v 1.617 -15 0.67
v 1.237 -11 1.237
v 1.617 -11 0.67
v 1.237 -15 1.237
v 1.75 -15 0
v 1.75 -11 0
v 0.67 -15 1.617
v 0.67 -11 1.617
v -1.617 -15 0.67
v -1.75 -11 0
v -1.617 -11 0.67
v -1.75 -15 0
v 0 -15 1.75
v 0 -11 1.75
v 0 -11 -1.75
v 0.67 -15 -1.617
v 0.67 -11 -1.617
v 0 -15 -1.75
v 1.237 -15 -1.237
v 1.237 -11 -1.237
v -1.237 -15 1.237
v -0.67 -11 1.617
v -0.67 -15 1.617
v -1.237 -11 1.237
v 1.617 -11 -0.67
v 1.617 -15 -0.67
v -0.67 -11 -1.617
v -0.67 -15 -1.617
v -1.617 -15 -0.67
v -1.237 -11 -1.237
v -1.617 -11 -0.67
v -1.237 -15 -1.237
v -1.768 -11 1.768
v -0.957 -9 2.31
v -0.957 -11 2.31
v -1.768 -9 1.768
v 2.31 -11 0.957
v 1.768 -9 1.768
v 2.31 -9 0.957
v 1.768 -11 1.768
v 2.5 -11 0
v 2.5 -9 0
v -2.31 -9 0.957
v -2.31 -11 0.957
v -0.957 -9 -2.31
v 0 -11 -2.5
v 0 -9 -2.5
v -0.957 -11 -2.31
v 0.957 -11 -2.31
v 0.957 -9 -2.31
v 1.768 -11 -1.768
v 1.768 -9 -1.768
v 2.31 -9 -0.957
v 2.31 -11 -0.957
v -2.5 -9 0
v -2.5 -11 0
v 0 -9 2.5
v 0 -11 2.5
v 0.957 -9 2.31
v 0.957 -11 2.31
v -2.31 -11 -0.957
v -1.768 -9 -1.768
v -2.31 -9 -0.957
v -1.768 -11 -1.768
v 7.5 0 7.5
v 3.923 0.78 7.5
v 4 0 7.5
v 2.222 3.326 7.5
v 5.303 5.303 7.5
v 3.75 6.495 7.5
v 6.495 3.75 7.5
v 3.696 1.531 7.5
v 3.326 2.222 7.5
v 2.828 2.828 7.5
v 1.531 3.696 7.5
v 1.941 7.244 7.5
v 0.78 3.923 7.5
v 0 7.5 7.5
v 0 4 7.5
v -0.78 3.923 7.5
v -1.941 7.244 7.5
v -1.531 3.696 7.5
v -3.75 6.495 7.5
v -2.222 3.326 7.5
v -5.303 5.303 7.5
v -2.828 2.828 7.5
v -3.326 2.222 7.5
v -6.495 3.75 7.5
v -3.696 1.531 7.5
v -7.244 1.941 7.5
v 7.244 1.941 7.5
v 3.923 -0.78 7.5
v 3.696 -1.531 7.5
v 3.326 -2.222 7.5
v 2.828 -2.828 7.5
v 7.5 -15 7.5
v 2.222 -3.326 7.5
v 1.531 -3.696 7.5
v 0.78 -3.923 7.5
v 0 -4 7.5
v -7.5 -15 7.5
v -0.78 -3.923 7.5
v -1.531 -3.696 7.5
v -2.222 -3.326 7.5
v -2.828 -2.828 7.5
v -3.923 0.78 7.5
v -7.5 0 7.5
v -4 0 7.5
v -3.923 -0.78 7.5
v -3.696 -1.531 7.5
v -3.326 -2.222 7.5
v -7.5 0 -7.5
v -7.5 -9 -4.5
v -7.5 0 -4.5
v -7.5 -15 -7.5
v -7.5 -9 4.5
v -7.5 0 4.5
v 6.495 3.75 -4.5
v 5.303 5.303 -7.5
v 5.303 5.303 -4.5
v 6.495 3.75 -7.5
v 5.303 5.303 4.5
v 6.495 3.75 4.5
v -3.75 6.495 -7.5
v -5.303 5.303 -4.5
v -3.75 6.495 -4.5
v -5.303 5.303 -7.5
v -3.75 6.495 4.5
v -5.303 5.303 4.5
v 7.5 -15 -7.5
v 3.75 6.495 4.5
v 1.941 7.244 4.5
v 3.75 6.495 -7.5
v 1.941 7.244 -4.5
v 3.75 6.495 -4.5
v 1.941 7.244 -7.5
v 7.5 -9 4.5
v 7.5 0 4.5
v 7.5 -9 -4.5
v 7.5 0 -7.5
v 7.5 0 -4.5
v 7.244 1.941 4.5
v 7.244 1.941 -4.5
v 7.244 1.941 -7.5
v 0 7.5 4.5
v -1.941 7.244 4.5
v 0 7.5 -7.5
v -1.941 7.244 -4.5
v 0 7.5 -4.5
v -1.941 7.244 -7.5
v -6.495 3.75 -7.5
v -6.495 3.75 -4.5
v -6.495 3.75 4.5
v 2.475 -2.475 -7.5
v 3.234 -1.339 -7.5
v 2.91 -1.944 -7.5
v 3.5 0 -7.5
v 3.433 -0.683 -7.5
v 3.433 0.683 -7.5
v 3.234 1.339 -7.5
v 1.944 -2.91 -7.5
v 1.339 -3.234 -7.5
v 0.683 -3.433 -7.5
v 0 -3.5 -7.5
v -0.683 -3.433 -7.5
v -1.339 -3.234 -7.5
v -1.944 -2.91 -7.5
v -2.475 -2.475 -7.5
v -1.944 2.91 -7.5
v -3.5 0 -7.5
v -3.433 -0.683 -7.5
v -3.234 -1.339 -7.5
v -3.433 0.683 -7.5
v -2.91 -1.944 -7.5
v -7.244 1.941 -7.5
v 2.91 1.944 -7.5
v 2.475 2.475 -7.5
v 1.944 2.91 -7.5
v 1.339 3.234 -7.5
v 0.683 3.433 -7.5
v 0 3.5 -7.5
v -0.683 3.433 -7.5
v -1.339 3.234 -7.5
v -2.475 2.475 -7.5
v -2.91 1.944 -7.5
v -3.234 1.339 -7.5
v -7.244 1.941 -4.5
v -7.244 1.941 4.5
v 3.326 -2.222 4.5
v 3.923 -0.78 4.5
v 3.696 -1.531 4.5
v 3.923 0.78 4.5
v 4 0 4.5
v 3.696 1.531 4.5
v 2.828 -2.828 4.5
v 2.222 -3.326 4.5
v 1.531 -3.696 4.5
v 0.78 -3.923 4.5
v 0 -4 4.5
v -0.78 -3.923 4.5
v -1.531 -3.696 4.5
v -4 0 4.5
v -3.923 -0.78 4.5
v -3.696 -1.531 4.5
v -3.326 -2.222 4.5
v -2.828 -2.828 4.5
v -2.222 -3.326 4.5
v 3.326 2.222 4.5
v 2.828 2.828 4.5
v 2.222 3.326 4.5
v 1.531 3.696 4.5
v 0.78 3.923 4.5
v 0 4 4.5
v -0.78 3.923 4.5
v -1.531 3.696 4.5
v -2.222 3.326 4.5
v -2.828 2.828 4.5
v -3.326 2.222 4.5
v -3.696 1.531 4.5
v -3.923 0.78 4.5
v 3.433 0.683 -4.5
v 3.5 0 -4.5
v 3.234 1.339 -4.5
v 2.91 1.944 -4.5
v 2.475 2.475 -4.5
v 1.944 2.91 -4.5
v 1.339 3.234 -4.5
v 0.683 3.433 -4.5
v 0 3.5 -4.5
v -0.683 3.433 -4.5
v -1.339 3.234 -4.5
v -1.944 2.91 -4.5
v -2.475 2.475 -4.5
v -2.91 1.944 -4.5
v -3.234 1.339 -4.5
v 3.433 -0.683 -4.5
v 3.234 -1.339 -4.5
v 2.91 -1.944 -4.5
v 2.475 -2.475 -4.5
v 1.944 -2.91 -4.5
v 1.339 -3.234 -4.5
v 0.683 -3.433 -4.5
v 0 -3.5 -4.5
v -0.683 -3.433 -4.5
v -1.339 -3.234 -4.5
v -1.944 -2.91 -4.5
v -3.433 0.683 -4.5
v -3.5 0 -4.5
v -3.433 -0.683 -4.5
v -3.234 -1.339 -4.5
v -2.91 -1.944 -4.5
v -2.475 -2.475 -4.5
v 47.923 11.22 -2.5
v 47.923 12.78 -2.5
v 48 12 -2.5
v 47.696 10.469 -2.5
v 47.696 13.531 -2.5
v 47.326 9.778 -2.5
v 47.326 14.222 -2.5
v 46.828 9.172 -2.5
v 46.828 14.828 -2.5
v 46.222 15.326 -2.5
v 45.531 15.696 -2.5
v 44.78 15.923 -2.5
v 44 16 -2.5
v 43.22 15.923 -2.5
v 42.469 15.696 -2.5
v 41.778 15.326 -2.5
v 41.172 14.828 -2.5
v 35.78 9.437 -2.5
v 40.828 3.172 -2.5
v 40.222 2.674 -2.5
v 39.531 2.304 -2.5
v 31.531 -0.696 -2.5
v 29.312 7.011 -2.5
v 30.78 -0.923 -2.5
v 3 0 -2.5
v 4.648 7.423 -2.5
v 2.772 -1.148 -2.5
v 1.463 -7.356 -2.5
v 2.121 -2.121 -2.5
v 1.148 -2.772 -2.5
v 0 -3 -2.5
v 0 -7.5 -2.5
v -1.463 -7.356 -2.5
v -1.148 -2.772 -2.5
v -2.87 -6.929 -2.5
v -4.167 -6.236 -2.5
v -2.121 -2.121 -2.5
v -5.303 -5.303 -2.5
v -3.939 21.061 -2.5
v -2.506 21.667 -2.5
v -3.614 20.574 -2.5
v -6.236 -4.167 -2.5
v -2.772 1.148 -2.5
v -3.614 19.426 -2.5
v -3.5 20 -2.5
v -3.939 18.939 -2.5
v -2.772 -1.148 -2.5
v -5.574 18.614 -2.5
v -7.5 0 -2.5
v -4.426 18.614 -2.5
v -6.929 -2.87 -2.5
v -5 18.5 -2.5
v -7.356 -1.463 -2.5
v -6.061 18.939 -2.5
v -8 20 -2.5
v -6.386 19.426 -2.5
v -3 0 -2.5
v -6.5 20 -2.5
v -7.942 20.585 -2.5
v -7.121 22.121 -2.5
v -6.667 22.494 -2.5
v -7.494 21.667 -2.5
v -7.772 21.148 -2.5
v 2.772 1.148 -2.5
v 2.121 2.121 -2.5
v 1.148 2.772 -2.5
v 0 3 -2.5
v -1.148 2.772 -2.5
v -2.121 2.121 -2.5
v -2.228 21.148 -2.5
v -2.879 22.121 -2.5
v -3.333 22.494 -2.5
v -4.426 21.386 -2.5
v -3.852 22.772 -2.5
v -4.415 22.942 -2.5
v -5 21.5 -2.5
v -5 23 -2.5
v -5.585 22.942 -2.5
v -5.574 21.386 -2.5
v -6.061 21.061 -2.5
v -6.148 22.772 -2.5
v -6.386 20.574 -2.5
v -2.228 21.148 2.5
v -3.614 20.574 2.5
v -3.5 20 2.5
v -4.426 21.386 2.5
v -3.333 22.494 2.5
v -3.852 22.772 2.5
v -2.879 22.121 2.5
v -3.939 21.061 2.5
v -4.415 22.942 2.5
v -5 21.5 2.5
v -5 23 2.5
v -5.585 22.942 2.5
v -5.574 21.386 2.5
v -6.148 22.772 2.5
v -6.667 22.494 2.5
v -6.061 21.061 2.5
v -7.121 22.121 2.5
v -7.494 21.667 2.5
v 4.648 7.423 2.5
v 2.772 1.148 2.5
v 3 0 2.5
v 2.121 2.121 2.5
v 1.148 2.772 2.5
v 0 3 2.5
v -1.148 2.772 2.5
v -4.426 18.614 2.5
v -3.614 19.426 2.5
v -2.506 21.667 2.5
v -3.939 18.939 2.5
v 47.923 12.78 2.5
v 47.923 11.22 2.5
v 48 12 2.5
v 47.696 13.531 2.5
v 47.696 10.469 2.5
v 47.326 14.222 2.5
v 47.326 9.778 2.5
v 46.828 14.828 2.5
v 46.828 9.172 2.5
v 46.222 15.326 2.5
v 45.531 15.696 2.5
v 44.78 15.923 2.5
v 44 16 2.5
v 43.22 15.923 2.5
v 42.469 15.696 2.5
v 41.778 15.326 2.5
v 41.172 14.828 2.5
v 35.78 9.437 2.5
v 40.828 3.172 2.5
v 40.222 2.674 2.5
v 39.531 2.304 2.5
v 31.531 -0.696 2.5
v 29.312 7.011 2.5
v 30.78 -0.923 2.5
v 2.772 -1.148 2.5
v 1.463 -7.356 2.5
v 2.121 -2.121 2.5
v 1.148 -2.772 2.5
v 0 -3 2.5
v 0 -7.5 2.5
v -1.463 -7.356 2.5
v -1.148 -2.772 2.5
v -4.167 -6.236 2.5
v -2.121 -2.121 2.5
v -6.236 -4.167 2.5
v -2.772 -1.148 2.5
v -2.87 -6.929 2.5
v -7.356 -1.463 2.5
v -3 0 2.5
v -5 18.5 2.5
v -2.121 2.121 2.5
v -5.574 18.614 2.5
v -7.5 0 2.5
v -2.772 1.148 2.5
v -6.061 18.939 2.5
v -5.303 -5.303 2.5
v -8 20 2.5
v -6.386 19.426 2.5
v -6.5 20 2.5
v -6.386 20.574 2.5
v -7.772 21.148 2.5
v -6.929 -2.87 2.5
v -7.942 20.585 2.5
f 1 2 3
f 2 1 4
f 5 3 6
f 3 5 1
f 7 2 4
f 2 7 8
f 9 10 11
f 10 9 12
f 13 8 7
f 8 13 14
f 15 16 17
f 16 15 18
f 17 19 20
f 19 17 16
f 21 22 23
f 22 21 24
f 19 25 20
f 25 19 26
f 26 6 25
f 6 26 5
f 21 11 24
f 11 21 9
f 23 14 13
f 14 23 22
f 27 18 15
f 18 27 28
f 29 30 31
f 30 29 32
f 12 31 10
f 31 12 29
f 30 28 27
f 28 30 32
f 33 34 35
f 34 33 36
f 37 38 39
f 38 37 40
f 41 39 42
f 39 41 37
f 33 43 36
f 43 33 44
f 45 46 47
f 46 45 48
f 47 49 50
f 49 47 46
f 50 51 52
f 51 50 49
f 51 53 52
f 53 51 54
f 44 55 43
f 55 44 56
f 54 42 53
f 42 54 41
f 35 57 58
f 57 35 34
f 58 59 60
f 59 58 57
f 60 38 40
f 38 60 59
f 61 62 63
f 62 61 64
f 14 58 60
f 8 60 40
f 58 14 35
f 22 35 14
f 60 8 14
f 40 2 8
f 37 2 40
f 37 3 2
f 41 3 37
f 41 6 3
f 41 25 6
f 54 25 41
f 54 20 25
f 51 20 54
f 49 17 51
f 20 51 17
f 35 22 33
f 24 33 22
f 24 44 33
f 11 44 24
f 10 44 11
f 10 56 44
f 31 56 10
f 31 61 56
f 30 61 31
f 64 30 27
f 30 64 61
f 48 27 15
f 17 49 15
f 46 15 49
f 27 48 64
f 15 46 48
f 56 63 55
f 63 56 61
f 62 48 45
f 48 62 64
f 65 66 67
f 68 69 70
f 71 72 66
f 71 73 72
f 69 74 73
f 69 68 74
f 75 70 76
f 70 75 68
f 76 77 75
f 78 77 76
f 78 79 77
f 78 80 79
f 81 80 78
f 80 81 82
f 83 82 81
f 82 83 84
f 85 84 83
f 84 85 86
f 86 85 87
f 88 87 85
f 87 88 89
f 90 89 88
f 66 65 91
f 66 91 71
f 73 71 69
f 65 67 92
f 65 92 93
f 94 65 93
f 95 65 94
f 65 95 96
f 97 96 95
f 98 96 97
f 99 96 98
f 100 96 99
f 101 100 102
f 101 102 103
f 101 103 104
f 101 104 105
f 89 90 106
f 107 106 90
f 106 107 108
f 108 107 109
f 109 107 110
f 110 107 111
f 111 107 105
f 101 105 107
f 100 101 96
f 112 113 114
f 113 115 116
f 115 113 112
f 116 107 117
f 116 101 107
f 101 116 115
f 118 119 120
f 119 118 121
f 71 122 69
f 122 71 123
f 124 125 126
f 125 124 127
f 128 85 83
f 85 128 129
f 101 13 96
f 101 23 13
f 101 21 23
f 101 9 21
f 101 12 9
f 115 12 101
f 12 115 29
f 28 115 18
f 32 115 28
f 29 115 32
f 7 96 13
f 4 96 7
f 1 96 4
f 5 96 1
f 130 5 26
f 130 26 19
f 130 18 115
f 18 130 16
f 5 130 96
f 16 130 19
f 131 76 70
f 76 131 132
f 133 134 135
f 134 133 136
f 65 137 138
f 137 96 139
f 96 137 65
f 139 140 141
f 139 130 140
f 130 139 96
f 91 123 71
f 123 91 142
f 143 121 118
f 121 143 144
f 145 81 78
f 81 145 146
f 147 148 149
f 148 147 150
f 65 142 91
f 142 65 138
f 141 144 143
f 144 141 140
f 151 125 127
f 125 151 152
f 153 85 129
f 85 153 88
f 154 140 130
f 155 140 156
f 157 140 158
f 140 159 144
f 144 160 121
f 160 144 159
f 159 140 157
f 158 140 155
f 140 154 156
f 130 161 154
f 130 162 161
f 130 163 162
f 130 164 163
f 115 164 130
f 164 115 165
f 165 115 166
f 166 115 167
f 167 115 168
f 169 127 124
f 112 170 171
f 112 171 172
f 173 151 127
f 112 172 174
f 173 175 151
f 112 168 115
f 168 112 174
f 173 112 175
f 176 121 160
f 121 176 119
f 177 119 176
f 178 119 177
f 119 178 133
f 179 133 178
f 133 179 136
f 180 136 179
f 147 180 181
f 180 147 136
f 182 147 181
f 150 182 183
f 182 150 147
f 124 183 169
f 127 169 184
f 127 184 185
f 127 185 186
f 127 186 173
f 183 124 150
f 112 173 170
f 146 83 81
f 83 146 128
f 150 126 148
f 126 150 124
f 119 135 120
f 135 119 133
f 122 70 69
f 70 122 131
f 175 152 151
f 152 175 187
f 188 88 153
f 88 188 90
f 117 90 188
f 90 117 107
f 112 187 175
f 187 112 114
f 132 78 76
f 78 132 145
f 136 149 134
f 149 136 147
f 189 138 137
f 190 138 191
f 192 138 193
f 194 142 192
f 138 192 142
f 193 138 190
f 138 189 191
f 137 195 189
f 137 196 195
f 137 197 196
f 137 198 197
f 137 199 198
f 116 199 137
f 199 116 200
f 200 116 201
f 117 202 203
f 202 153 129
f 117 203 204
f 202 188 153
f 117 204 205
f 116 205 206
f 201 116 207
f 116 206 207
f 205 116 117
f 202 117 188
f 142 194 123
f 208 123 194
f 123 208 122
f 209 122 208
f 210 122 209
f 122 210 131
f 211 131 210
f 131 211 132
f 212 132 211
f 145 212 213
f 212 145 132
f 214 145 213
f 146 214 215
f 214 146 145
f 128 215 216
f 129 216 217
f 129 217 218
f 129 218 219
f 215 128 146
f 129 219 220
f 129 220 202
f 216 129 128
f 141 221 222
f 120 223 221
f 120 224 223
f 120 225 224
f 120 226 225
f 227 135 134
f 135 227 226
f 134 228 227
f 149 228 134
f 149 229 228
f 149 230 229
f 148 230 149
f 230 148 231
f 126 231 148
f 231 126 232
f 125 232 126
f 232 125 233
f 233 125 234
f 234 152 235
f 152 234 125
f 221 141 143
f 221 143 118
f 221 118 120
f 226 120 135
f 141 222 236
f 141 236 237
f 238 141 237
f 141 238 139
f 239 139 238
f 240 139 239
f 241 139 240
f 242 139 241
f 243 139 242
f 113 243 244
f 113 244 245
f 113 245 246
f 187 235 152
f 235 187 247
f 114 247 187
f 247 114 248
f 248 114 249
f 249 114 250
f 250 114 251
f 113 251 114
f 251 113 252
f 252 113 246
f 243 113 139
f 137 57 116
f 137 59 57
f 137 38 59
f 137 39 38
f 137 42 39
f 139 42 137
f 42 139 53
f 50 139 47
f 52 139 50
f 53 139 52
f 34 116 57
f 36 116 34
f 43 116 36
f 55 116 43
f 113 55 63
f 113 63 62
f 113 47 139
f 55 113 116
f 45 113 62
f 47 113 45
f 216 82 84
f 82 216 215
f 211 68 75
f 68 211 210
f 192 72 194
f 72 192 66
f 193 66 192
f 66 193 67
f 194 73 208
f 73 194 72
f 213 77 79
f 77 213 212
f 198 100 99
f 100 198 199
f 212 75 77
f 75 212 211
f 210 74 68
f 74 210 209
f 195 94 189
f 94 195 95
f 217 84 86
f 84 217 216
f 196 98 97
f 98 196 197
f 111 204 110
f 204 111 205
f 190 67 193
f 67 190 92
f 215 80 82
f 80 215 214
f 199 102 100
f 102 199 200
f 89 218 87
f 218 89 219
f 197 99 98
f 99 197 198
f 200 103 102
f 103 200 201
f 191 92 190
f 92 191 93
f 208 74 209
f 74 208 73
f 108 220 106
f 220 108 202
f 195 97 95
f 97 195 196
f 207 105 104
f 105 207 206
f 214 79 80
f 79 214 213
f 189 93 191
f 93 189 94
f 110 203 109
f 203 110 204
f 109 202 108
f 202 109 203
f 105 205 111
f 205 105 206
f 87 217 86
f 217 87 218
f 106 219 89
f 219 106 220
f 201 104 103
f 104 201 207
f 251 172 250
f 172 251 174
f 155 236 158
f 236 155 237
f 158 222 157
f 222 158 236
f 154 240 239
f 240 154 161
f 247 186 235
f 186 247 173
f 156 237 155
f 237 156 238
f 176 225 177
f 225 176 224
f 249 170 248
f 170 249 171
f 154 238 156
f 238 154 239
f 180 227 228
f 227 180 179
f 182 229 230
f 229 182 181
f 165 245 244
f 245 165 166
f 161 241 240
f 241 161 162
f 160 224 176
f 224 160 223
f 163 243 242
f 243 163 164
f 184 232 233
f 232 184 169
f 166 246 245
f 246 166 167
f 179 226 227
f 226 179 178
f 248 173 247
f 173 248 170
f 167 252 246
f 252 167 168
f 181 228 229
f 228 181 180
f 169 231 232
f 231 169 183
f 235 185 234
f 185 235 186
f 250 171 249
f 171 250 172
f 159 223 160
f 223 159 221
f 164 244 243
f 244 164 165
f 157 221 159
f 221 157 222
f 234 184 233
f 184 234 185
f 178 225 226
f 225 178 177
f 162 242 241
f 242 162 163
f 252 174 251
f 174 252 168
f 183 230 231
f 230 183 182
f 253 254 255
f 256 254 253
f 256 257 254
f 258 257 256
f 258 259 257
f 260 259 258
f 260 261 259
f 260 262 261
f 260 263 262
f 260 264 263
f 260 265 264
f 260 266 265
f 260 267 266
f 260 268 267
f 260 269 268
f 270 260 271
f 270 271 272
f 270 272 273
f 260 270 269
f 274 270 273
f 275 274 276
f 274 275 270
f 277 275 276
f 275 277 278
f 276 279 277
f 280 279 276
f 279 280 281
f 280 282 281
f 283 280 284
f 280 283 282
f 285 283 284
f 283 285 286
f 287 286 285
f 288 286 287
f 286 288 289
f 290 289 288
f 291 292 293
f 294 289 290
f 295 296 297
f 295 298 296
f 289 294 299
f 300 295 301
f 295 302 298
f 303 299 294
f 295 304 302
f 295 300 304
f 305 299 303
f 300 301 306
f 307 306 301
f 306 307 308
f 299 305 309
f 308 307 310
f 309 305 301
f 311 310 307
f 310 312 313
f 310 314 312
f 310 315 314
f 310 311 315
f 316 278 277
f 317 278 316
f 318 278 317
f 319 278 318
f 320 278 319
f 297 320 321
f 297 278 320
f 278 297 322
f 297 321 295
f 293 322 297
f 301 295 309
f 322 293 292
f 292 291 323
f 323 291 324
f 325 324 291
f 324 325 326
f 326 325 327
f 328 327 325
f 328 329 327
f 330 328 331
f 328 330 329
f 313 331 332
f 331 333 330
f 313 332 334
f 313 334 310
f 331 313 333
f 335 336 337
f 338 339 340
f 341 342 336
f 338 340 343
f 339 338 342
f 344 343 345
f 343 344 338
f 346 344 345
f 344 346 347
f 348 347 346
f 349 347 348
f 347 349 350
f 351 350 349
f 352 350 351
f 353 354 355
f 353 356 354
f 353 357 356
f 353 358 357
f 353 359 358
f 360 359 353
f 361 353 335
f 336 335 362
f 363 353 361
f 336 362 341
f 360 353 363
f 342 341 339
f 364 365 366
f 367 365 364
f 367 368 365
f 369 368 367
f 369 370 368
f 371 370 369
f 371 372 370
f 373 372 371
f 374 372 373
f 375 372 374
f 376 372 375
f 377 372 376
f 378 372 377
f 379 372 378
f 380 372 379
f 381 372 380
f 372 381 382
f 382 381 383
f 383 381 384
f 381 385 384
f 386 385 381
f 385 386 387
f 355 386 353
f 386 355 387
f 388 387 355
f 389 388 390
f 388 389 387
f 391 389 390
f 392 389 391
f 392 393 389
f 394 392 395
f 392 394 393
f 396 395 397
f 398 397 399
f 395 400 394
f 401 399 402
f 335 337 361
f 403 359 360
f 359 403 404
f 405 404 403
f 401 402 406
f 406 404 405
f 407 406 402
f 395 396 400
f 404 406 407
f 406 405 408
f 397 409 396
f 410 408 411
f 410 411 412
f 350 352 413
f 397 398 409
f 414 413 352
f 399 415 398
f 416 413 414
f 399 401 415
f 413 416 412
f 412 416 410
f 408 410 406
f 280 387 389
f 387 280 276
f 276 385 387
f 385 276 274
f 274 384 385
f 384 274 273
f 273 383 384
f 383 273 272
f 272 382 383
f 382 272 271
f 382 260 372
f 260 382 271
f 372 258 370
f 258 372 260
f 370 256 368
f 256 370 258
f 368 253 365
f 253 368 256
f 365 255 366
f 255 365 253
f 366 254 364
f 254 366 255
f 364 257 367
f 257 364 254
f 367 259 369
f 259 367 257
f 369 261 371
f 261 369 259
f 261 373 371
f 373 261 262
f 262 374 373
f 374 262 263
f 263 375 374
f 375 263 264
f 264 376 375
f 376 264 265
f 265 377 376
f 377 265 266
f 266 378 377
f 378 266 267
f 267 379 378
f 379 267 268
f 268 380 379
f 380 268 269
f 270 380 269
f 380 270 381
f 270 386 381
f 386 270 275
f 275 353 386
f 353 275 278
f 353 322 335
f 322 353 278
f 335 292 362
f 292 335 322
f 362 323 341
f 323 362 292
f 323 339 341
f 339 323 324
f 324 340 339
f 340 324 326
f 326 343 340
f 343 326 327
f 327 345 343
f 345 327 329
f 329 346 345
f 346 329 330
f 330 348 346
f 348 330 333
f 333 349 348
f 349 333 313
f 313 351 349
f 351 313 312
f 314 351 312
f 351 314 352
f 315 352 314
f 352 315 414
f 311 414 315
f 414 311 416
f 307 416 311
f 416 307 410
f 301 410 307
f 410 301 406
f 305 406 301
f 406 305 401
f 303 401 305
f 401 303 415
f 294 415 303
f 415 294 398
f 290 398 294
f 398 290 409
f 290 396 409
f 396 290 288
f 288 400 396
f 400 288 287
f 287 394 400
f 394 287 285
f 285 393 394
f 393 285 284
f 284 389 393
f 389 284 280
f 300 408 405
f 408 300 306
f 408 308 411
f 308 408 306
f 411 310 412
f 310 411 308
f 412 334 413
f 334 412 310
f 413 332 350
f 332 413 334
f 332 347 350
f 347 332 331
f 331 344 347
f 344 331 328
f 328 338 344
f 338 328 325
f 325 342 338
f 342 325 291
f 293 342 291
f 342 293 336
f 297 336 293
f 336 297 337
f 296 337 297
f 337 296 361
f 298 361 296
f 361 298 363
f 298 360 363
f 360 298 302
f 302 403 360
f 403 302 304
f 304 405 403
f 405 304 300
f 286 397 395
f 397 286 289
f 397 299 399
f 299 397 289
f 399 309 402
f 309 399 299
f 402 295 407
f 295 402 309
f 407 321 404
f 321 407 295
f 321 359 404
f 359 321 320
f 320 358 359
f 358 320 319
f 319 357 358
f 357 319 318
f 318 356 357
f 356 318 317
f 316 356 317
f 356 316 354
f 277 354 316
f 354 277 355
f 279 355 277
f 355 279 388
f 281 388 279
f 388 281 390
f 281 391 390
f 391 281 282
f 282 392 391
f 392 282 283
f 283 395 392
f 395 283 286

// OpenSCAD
// file: config.scad
lever_thickness = 5;
layer_spacing = 4;

mount_thickness = 6;

pot_shaft_diameter = 6;
pot_mount_diameter = 8;

mount_screw_diameter = 3.5;
mount_screw_cutout_diameter = 5;
// file: lever.scad
include <config.scad>;

module HullPart(pa, pb, da, db)
{
  hull()
  {
    translate(pa)
    {
      circle(d=da, $fn=32);
    }

    translate(pb)
    {
      circle(d=db, $fn=32);
    }
  }
}

module Lever()
{
  pq = [-5, 20];
  pa = [0, 0];
  pb = [30, 3];
  pc = [38, 6];
  pd = [44, 12];

  dq = 6;
  da = 15;
  db = 8;
  dc = 8;
  dd = 8;

  difference()
  {
    union()
    {
      HullPart(pa, pq, da, dq);
      HullPart(pa, pb, da, db);
      HullPart(pb, pc, db, dc);
      HullPart(pc, pd, dc, dd);
    }

    translate(pa)
    {
      circle(d=pot_shaft_diameter, $fn=16);
    }

    translate(pq)
    {
      circle(d=3, $fn=16);
    }
  }
}

Lever();
// file: mount.scad
include <config.scad>

module Mount()
{
  dim = 15;

  difference()
  {
    linear_extrude(lever_thickness + layer_spacing + mount_thickness, center=true)
    {
      hull()
      {
        circle(d=dim);

        translate([0, -10])
        {
          square([dim, 10], center=true);
        }
      }
    }

    cube([16, 18, lever_thickness + layer_spacing], center=true);

    cylinder(h=50, d=pot_mount_diameter, $fn=32);

    rotate([180, 0, 0])
    {
      cylinder(h=50, d=pot_shaft_diameter + 1, $fn=32);
    }

    rotate([90, 0, 0])
    {
      cylinder(h=50, d=mount_screw_diameter, $fn=16);
      cylinder(h=11, d=mount_screw_cutout_diameter, $fn=16);
    }
  }
}

Mount();
// file: lever_3d.scad
use <lever.scad>;
include <config.scad>;

module Lever3D()
{
  linear_extrude(lever_thickness, center=true)
  {
    Lever();
  }
}

Lever3D();
// main file
use <lever_3d.scad>;
use <mount.scad>;

color("blue")
{
  Mount();
}

color("red")
{
  Lever3D();
}
